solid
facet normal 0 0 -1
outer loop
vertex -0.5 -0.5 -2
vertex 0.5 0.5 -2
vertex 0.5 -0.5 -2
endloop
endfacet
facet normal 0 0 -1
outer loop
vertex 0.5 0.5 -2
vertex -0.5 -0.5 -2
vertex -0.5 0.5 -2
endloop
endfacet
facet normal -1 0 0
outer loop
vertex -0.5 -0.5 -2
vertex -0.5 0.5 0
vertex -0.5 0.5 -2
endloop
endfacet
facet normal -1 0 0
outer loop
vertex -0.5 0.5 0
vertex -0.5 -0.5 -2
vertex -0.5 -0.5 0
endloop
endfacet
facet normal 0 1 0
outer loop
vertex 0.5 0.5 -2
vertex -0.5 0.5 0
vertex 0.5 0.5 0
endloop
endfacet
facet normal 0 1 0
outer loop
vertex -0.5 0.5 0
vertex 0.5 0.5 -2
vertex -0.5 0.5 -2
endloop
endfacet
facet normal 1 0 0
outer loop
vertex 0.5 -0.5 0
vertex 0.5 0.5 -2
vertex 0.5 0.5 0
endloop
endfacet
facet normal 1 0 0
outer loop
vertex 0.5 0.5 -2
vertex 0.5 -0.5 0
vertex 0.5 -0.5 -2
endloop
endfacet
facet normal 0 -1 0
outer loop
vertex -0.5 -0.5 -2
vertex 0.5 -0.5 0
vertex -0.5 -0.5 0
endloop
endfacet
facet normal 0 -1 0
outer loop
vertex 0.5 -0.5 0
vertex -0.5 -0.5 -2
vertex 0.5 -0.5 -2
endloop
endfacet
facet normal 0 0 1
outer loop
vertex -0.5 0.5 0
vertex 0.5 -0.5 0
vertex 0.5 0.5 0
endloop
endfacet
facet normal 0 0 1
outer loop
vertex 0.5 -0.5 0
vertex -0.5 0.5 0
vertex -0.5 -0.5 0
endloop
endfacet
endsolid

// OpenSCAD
// Generate 2 random values between 10 and 30
r = rands(1, 3, 2);

// Calculate width and length from random values
width = r[2];
length = 40 * r[0];

difference() {
    // Create border
    linear_extrude(4, center = true)
        square([length + 4, width + 4], center = true);
    // Cut the area for the text
    linear_extrude(2)
        square([length + 2, width + 2], center = true);
    // Fit the text into the area based on the length
    color("lightcoral")
        linear_extrude(1.5, center = true, convexity = 4)
                resize([length, 0], auto = true)
                    text("cOmp_F0rm!", valign = "left", halign = "right");
}
